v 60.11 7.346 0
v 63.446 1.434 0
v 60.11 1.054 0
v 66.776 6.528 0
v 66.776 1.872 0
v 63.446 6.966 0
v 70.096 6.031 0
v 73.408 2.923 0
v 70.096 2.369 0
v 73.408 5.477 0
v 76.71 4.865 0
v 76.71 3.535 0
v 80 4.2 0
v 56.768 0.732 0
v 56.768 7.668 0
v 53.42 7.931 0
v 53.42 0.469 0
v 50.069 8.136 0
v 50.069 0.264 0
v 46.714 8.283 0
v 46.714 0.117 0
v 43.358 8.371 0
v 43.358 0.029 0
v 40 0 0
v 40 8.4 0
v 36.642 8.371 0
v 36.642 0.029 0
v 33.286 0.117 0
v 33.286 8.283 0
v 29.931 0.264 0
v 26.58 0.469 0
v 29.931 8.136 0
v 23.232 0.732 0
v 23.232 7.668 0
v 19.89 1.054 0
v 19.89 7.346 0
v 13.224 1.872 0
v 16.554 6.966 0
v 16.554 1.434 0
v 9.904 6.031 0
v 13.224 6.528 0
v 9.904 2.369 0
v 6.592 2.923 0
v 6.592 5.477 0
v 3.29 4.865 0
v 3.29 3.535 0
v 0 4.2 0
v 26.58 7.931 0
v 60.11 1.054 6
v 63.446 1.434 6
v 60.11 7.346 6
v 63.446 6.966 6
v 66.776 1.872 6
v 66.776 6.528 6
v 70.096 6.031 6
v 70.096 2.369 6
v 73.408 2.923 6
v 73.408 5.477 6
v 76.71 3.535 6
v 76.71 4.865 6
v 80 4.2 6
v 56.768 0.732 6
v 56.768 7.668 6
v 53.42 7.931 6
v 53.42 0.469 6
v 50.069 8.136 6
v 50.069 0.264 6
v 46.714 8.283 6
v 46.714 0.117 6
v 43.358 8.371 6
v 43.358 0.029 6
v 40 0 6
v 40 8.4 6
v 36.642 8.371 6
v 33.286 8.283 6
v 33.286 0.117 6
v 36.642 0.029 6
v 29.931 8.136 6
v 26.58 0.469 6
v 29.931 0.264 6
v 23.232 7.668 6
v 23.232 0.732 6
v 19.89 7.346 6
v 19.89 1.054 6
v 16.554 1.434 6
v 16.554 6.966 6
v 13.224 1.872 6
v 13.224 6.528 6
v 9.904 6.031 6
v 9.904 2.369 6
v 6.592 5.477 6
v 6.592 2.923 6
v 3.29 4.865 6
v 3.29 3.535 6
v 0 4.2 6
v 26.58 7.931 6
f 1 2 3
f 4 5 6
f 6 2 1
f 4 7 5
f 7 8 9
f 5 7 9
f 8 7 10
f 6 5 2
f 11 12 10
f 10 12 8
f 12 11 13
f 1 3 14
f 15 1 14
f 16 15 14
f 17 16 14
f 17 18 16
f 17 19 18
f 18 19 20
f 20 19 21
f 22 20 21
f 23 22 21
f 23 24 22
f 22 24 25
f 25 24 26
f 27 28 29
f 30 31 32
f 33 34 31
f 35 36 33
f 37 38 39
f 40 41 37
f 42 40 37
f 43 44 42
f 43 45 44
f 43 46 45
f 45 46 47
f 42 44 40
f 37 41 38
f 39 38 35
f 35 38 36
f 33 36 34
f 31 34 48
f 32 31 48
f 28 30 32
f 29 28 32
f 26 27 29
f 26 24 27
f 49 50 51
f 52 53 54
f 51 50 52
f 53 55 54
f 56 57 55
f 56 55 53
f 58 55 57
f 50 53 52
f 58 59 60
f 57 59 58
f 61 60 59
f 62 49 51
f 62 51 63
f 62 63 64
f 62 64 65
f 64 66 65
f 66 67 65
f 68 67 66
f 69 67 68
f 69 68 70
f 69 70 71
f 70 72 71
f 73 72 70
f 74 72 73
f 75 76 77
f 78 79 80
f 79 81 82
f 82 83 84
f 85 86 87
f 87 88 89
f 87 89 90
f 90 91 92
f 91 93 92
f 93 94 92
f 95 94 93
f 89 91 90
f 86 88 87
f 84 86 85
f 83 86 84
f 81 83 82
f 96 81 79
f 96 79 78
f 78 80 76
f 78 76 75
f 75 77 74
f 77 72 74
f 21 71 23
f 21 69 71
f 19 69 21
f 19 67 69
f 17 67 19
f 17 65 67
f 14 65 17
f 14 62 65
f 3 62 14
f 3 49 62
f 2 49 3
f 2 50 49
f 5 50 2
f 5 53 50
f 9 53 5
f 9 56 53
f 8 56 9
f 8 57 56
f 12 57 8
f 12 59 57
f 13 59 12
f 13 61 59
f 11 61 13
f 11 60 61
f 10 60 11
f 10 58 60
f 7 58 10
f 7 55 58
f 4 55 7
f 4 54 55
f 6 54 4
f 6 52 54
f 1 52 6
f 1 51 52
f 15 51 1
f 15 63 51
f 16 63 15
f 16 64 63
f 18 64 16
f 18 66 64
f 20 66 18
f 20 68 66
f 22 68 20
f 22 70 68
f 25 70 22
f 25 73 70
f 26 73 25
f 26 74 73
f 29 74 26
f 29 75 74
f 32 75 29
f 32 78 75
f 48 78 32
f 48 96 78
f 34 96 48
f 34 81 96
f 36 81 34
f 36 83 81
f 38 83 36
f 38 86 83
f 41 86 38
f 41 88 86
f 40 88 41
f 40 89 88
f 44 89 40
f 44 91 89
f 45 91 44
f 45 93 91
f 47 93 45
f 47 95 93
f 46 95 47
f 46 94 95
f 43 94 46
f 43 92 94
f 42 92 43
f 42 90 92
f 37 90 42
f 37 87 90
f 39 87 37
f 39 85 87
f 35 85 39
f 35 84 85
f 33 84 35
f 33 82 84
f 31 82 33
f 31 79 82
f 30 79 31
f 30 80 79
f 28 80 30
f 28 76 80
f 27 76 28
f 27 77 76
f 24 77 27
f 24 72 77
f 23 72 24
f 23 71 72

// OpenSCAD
$fn = 32;

// ----------------------------------------------------------------------
// Arc profile plate: lens, 48 points
// ----------------------------------------------------------------------

// --- parameters (mm) ---
lens_chord = 80;          // chord length of the lens, X
arc_r = 192.39;           // radius of both arcs
arc_angle = 24;           // angle of each arc, degrees
sagitta = 4.2;            // bulge of each arc (half the lens height)
arc_step = 1;             // sampling step of the arcs, degrees
plate_t = 6;              // plate thickness, Z

bbox_y = 2 * sagitta;  // full lens height

profile = [[80, 4.2], [76.71, 4.865], [73.408, 5.477], [70.096, 6.031], [66.776, 6.528], [63.446, 6.966], [60.11, 7.346], [56.768, 7.668], [53.42, 7.931], [50.069, 8.136], [46.714, 8.283], [43.358, 8.371], [40, 8.4], [36.642, 8.371], [33.286, 8.283], [29.931, 8.136], [26.58, 7.931], [23.232, 7.668], [19.89, 7.346], [16.554, 6.966], [13.224, 6.528], [9.904, 6.031], [6.592, 5.477], [3.29, 4.865], [0, 4.2], [3.29, 3.535], [6.592, 2.923], [9.904, 2.369], [13.224, 1.872], [16.554, 1.434], [19.89, 1.054], [23.232, 0.732], [26.58, 0.469], [29.931, 0.264], [33.286, 0.117], [36.642, 0.029], [40, 0], [43.358, 0.029], [46.714, 0.117], [50.069, 0.264], [53.42, 0.469], [56.768, 0.732], [60.11, 1.054], [63.446, 1.434], [66.776, 1.872], [70.096, 2.369], [73.408, 2.923], [76.71, 3.535]];  // primary outline, 48 points, counter clockwise

// --- the one profile operation ---
linear_extrude(height = plate_t) polygon(points = profile);
